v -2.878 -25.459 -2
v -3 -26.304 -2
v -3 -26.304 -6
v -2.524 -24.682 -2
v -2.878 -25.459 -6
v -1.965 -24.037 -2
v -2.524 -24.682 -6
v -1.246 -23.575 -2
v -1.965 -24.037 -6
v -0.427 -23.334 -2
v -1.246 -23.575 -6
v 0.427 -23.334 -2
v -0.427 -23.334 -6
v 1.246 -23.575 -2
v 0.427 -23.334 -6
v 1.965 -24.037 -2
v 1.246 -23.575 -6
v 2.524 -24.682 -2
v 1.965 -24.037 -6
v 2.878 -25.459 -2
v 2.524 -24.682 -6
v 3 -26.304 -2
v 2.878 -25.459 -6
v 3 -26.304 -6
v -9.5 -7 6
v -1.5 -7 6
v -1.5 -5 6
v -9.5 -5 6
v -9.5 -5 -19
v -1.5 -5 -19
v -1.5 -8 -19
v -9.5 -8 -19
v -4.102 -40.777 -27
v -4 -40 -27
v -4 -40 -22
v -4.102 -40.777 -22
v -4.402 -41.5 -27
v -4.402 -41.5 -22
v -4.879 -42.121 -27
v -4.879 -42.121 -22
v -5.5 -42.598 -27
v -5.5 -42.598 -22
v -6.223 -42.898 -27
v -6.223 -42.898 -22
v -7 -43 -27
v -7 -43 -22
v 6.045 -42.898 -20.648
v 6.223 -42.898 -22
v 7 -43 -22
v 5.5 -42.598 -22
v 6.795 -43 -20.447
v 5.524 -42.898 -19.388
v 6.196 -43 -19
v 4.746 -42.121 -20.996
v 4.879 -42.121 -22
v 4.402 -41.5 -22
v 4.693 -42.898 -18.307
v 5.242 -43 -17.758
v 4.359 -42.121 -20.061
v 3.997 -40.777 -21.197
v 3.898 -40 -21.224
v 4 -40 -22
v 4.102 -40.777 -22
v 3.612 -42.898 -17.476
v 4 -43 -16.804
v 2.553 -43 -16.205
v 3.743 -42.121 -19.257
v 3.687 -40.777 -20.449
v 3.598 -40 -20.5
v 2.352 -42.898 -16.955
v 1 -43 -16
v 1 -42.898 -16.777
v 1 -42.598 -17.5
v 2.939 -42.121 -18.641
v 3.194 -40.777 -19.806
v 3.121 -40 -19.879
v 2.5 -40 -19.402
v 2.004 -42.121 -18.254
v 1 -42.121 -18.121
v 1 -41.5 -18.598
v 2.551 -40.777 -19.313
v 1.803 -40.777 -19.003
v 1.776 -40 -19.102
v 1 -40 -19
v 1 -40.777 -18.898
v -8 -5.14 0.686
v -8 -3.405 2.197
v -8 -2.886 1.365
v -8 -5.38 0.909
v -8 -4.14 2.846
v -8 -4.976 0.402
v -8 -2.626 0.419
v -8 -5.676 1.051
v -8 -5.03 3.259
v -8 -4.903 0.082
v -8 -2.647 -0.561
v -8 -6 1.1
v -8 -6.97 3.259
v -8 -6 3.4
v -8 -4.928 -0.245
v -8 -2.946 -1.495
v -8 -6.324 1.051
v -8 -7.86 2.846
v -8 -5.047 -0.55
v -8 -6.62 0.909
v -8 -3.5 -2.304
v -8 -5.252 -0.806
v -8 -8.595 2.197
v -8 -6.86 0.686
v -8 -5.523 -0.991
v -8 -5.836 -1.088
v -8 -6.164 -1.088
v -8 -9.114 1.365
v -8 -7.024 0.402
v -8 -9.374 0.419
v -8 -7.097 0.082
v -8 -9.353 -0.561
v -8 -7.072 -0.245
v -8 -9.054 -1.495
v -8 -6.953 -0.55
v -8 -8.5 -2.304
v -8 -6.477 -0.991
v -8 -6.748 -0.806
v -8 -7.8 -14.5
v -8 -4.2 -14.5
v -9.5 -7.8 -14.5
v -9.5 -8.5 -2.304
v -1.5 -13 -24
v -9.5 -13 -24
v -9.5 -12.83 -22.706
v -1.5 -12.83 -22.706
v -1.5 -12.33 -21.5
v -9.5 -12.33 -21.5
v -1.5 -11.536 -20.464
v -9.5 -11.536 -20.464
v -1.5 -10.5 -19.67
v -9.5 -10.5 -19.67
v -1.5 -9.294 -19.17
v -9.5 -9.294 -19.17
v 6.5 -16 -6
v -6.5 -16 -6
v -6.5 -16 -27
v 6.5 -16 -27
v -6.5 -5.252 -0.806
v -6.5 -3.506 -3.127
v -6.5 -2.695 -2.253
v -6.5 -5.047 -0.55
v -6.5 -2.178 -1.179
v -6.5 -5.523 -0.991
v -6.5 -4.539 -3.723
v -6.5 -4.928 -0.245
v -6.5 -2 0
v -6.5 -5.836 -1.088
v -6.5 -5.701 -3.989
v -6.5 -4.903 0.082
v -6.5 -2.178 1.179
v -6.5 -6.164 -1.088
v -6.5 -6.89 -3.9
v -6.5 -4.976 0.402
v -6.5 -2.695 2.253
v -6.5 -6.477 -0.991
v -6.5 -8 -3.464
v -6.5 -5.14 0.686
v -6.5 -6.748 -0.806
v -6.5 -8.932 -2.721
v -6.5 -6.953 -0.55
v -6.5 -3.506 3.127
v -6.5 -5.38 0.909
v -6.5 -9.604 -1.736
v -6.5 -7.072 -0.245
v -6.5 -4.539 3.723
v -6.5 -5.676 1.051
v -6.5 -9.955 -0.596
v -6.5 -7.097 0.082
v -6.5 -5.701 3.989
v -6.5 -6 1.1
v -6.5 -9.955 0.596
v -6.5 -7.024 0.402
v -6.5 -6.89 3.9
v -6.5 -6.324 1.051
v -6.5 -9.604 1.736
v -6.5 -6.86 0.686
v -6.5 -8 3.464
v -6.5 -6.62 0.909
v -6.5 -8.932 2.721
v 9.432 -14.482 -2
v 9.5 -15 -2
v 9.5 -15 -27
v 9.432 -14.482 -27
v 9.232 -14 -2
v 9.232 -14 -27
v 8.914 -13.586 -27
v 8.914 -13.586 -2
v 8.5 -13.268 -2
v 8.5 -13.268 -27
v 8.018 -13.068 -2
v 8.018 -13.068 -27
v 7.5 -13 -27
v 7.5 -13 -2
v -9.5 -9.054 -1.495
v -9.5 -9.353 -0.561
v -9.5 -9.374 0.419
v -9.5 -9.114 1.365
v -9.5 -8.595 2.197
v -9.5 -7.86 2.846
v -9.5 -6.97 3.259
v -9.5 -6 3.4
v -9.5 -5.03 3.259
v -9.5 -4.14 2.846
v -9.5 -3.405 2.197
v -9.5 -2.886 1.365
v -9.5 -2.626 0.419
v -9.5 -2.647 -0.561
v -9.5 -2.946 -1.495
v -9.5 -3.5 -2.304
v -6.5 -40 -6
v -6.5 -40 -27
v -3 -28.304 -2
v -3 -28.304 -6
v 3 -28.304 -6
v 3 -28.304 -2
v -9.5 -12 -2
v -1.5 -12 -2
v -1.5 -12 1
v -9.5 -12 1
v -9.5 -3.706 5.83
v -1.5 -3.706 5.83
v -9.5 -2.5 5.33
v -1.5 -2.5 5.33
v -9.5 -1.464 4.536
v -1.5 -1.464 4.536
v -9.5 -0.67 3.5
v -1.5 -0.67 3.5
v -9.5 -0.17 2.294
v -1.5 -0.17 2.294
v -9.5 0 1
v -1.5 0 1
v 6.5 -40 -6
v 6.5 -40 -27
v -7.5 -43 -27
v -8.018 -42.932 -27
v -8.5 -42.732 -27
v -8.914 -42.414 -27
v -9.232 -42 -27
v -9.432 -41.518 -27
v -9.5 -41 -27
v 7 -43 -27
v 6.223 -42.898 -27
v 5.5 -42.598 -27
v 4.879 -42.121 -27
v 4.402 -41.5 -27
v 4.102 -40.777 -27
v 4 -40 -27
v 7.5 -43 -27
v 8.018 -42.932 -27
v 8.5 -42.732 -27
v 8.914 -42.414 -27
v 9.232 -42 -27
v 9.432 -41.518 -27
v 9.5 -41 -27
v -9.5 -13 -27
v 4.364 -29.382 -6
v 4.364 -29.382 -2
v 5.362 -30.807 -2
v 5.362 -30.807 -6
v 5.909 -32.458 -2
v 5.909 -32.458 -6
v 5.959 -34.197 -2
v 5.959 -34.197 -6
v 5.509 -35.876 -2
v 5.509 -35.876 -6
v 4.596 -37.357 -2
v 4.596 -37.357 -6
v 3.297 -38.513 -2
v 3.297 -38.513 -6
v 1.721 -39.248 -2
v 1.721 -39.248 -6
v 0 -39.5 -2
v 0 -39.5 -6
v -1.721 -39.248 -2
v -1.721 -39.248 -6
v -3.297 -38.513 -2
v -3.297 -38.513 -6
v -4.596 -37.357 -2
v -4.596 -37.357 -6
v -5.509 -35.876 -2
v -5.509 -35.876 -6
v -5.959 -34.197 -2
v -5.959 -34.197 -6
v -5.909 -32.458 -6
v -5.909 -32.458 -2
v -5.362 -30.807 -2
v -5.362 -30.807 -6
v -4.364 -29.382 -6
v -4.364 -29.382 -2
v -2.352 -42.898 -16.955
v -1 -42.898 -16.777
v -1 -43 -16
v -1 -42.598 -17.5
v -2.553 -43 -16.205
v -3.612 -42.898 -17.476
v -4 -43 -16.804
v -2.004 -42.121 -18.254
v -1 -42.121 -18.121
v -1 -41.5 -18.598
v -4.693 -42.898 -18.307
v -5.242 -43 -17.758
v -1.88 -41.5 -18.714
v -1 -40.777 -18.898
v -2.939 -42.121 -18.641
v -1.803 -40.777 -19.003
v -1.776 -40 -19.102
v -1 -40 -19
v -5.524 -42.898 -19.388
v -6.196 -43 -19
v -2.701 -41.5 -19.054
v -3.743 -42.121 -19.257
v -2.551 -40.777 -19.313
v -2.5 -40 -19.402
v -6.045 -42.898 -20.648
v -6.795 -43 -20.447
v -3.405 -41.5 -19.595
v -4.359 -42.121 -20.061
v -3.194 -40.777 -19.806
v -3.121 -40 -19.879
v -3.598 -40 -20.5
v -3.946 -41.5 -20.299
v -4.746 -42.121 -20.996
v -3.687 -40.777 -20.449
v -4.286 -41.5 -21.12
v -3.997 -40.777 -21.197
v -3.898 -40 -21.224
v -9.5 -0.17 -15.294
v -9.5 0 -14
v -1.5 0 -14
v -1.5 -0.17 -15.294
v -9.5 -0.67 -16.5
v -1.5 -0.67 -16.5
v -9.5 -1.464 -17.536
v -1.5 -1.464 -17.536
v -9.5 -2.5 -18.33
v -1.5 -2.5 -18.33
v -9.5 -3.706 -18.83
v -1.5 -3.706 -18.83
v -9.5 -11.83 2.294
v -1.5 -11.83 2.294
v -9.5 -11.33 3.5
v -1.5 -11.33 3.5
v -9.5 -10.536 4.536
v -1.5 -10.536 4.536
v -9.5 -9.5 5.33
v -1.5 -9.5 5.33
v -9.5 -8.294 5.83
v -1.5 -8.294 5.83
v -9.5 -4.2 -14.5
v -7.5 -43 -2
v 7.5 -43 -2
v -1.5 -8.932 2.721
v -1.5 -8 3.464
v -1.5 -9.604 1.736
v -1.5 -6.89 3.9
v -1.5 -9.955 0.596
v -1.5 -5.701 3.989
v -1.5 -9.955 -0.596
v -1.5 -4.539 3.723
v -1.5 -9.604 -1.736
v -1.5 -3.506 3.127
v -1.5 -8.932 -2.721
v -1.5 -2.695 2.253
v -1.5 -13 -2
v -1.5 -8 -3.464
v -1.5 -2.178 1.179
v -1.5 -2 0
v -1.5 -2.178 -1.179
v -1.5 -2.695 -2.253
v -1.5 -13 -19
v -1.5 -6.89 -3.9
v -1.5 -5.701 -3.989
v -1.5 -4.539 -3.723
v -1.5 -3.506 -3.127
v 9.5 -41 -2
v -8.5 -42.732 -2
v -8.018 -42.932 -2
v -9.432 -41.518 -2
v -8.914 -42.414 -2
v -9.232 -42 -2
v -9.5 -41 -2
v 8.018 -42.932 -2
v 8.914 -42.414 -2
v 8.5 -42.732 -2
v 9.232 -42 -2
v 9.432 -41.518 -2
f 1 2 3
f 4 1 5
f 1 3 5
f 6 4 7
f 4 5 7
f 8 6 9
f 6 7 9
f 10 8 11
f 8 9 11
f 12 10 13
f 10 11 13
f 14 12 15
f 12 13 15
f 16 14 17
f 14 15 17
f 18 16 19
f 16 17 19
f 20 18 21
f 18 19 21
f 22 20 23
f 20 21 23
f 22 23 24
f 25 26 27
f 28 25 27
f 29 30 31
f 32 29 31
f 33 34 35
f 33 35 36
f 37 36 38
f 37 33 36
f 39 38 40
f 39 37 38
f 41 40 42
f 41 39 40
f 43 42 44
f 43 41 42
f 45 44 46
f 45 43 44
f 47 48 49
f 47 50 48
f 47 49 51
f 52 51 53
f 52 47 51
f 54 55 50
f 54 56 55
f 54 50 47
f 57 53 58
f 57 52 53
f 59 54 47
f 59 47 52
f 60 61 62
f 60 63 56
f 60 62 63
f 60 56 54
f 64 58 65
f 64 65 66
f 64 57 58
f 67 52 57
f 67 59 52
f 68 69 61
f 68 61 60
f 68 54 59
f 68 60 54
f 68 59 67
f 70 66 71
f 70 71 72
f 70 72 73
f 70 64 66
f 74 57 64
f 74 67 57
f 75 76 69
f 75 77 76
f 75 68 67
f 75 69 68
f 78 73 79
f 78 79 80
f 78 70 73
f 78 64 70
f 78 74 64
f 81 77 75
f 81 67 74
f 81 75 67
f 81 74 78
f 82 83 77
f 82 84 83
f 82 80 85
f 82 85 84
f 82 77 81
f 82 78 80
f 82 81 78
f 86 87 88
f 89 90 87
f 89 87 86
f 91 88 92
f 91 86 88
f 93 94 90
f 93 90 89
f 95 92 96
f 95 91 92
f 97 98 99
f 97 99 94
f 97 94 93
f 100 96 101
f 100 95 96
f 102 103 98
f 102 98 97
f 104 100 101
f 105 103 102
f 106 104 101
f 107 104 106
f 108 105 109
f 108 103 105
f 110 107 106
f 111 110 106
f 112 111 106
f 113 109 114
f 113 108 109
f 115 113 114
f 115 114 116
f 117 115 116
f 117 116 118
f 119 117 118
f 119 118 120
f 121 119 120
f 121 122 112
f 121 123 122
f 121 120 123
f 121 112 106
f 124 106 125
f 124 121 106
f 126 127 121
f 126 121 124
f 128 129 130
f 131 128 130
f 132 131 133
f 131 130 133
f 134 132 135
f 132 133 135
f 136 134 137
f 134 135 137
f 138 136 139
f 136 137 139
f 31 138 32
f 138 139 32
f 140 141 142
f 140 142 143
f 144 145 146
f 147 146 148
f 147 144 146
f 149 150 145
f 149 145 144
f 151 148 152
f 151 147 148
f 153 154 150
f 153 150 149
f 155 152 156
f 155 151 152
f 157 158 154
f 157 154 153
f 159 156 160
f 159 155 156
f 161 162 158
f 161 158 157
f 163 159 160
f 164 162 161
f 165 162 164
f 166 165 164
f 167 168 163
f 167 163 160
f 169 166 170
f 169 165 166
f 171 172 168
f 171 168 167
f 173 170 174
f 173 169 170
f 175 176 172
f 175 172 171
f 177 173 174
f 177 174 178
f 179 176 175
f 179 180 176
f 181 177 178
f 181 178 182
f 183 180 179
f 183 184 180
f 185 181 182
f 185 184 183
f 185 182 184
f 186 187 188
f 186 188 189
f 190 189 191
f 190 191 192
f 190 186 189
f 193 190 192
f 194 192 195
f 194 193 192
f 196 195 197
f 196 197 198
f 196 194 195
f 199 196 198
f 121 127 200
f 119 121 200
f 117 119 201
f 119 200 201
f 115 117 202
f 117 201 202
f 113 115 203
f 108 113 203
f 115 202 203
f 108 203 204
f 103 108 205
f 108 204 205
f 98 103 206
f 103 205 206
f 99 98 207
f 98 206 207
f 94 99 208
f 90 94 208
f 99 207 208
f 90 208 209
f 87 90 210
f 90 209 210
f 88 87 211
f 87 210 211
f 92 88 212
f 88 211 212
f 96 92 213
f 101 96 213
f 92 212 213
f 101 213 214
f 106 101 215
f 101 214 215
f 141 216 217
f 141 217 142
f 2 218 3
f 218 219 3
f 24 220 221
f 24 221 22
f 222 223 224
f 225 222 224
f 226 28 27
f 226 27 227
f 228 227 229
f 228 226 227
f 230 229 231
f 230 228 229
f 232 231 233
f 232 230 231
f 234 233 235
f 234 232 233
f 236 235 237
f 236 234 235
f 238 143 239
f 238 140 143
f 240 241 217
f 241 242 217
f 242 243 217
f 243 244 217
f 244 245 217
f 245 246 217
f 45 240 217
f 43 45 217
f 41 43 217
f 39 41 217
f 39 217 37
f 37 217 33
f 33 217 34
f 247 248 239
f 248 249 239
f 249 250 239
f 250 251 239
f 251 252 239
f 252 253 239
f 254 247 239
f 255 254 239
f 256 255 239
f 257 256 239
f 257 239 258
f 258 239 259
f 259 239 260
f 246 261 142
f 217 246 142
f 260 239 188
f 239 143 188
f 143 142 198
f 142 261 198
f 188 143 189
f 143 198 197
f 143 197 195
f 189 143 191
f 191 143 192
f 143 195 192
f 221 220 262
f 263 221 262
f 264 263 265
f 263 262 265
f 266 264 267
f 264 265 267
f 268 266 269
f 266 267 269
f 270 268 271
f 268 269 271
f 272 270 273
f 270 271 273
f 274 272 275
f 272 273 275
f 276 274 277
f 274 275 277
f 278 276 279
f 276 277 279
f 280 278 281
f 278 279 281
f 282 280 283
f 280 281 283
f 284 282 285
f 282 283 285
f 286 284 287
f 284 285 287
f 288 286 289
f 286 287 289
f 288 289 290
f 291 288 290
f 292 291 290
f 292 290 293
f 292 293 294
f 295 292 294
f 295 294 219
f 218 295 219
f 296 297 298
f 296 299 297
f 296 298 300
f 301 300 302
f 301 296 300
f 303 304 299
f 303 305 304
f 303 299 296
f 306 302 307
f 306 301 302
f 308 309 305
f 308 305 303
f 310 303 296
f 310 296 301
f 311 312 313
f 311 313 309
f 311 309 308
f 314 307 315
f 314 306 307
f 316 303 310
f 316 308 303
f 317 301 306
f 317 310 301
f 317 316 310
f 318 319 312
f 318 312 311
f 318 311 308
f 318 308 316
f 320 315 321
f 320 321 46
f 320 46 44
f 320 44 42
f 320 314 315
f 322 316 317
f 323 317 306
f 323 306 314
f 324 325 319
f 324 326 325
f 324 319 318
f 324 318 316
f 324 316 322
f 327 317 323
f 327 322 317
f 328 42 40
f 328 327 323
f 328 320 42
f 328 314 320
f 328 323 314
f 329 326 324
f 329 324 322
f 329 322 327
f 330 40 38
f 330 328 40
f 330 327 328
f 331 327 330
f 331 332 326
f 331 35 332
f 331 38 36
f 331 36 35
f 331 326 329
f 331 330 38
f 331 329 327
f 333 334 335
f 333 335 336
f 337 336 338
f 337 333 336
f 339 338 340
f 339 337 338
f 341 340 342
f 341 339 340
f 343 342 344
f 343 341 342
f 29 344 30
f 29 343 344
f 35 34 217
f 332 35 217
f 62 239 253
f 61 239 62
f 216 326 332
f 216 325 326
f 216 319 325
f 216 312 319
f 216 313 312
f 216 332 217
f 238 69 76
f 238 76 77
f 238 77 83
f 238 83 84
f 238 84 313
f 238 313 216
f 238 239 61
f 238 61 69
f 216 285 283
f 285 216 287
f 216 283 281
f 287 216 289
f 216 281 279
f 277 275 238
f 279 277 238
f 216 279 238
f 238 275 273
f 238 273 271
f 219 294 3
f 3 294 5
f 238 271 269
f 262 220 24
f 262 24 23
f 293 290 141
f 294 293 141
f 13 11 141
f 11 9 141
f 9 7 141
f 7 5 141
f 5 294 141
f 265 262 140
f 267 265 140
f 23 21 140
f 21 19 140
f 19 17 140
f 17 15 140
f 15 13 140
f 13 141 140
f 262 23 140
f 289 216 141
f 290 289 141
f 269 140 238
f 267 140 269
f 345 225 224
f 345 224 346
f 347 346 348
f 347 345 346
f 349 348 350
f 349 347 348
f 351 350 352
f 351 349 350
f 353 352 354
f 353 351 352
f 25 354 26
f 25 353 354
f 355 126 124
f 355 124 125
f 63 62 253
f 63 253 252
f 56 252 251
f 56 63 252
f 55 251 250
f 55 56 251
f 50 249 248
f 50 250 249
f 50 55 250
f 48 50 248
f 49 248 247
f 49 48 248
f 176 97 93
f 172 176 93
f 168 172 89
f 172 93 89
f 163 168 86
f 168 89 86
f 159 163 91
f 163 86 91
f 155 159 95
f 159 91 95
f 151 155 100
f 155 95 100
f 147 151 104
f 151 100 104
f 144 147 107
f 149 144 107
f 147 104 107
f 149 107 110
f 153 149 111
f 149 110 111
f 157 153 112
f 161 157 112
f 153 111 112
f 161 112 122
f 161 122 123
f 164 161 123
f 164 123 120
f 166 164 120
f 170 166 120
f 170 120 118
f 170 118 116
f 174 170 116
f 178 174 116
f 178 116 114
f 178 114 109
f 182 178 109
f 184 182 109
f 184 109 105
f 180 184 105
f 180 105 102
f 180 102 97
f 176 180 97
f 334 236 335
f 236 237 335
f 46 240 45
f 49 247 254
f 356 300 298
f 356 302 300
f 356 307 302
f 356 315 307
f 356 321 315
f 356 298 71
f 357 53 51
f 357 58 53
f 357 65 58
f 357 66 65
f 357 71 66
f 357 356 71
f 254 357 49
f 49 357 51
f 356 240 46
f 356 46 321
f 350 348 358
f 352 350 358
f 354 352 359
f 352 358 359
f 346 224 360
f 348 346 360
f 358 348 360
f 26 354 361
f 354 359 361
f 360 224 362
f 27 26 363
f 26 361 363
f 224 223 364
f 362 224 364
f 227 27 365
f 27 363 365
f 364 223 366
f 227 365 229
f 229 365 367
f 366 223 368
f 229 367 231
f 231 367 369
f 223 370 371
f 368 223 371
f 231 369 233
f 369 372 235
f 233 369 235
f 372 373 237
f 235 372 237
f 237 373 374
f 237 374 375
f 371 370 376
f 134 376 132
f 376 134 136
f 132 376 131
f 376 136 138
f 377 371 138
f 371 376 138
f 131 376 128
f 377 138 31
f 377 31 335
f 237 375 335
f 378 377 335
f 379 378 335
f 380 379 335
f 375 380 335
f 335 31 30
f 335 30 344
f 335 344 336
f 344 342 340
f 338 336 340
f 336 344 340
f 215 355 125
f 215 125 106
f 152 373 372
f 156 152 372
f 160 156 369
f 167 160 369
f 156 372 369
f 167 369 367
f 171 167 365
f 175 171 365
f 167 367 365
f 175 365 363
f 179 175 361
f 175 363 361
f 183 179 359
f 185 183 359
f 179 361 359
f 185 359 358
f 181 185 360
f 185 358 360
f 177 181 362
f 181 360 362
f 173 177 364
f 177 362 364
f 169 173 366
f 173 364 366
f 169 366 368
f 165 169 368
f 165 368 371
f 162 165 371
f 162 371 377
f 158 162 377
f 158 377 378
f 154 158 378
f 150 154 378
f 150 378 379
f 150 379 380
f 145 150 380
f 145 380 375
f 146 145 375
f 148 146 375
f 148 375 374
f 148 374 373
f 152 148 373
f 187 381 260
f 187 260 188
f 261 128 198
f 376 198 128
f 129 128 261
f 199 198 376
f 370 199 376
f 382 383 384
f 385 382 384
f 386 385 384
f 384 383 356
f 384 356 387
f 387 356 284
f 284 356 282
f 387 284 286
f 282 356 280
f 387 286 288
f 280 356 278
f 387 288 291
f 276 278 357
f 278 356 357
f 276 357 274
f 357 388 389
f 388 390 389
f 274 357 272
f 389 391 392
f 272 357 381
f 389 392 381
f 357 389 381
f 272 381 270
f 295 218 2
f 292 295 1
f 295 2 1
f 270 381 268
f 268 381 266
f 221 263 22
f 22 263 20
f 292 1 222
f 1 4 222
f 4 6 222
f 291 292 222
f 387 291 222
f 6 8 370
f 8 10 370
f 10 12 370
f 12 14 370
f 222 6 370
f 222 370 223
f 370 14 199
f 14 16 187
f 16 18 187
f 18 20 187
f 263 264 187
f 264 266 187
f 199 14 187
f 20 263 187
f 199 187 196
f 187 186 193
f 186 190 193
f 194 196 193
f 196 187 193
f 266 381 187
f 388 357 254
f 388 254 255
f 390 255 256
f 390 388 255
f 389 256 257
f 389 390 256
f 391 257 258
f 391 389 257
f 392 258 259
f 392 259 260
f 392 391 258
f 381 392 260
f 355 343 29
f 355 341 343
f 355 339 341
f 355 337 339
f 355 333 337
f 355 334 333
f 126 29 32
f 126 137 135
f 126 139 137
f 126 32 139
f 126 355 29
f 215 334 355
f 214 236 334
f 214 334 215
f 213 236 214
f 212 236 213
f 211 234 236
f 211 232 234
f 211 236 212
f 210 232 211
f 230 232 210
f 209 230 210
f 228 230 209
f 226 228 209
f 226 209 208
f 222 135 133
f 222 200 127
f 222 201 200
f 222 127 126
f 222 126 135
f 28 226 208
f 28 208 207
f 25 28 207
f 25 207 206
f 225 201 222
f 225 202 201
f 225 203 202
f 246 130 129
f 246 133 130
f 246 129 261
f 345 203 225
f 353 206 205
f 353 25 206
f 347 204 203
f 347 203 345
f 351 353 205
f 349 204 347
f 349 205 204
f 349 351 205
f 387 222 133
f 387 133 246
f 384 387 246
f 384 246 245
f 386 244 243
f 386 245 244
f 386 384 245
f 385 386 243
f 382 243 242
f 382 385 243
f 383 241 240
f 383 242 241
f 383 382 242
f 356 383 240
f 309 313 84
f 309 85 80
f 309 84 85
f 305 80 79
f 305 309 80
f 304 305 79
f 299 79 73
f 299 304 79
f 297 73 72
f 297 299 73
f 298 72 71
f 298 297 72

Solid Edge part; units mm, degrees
sketch "Sketch1" plane through (0, 0, 0) normal (0, -1, 0) x (1, 0, 0)
  line L0 (-7, -6) -> (7, -6)
  line L1 (7, -6) -> (7, 6)
  line L2 (7, 6) -> (-7, 6)
  line L3 (-7, 6) -> (-7, -6)
  dimension "D1" = 12
  dimension "D2" = 14
extrude "Protrusion1" add sketch "Sketch1" along normal blind 40
sketch "Sketch2" plane through (0, -18, -6) normal (0, 0, -1) x (0, 1, 0)
  circle A0 centre (-15.5, 0) radius 6
  dimension "D1" = 12
  dimension "D2" = 6.5
extrude "Cutout1" cut sketch "Sketch2" against normal through all
sketch "Sketch3" plane through (7, -15, 0) normal (1, 0, 0) x (0, 1, 0)
  line L0 (-25, -2) -> (3, -2)
  line L1 (3, -2) -> (3, 6)
  dimension "D1" = 8
  dimension "D2" = 28
extrude "Cutout2" cut sketch "Sketch3" against normal through all material side at (7, -26, -1.95)
sketch "Sketch4" plane through (0, -18, -6) normal (0, 0, -1) x (0, 1, 0)
  line L0 (-10.3038, 3) -> (-8.3038, 3)
  arc A0 (-8.3038, 3) -> (-8.3038, -3) centre (-8.3038, 0) cw
  line L1 (-10.3038, -3) -> (-8.3038, -3)
  line L2 (-10.3038, 3) -> (-10.3038, -3)
  dimension "D1" = 6
  dimension "D2" = 2
extrude "Cutout3" cut sketch "Sketch4" against normal through all
sketch "Sketch5" plane through (7, -20, 0) normal (1, 0, 0) x (0, -1, 0)
  line L0 (20, 2) -> (23, 2)
  line L1 (23, 2) -> (23, 27)
  line L2 (23, 27) -> (20, 27)
  line L3 (20, 27) -> (20, 2)
  dimension "D1" = 3
  dimension "D2" = 25
extrude "Protrusion2" add sketch "Sketch5" against normal up to vertex (14 mm away)
sketch "Sketch6" plane through (0, -23, -6) normal (0, 0, -1) x (0, -1, 0)
  line L0 (17, 6.5) -> (-7, 6.5)
  line L1 (-7, 6.5) -> (-7, -6.5)
  line L2 (-7, -6.5) -> (17, -6.5)
  line L3 (17, -6.5) -> (17, -7)
  line L4 (17, -7) -> (20, -7)
  line L5 (20, -7) -> (20, -9.5)
  line L6 (20, -9.5) -> (-10, -9.5)
  line L7 (-10, -9.5) -> (-10, 9.5)
  line L8 (-10, 9.5) -> (20, 9.5)
  line L9 (20, 9.5) -> (20, 7)
  line L10 (20, 7) -> (17, 7)
  line L11 (17, 7) -> (17, 6.5)
  dimension "D1" = 13
  dimension "D2" = 3
  dimension "D3" = 3
  dimension "D4" = 3
  dimension "D5" = 24
extrude "Protrusion3" add sketch "Sketch6" along normal up to vertex (21 mm away) and the other way up to vertex (4 mm away)
sketch "Sketch7" plane through (0, -43, -14.5) normal (0, -1, 0) x (-1, 0, 0)
  line L0 (-4, 4.5) -> (4, 4.5)
  line L1 (4, 4.5) -> (4, 12.5)
  line L2 (4, 12.5) -> (-4, 12.5)
  line L3 (-4, 12.5) -> (-4, 4.5)
  dimension "D1" = 8
  dimension "D2" = 8
extrude "Cutout4" cut sketch "Sketch7" against normal up to next
fillet "Verrundung_9" radius 3 2 edges at (4, -41.5, -19) (-4, -41.5, -19)
fillet "Verrundung_10" radius 3 5 edges at (0, -43, -19) (-3.1213, -43, -19.8787) (-4, -43, -24.5) (3.1213, -43, -19.8787) (4, -43, -24.5)
sketch "Sketch8" plane through (9.5, -28, -14.5) normal (1, 0, 0) x (0, 1, 0)
  line L0 (15, 12.5) -> (16, 12.5)
  line L1 (16, 12.5) -> (16, 20.5)
  line L2 (16, 20.5) -> (28, 20.5)
  line L3 (28, 20.5) -> (28, -4.5)
  line L4 (28, -4.5) -> (15, -4.5)
  line L5 (15, -4.5) -> (15, 12.5)
  dimension "D1" = 25
extrude "Protrusion4" add sketch "Sketch8" against normal up to vertex (19 mm away)
sketch "Sketch9" plane through (-9.5, -21.5, -10.5) normal (-1, 0, 0) x (0, 1, 0)
  arc A0 (13, -8.1957) -> (18, -8.1957) centre (15.5, -10.5) ccw
  line L0 (17.3, 4) -> (18, -8.1957)
  line L1 (13.7, 4) -> (17.3, 4)
  line L2 (13, -8.1957) -> (13.7, 4)
  dimension "D1" = 3.4
  dimension "D2" = 3.6
  dimension "D3" = 14.5
  dimension "D4" = 6
  dimension "D5" = 5
extrude "Extrusionsausschnitt_13" cut sketch "Sketch9" against normal blind 1.5
sketch "Sketch10" plane through (0, -6.5, -19) normal (0, 0, -1) x (0, 1, 0)
  line L0 (-6.5, 9.5) -> (-6.5, -1.5)
  line L1 (-6.5, -1.5) -> (6.5, -1.5)
  dimension "D1" = 8
extrude "Cutout5" cut sketch "Sketch10" against normal through all material side at (4, -12.95, -19)
sketch "Sketch11" plane through (-9.5, -21.5, -10.5) normal (-1, 0, 0) x (0, 0, 1)
  circle A0 centre (10.5, 15.5) radius 1.1
  dimension "D1" = 2.2
extrude "Cutout6" cut sketch "Sketch11" against normal through all
sketch "Sketch12" plane through (-1.5, -6.5, -6.5) normal (1, 0, 0) x (0, 1, 0)
  circle A0 centre (0.5, 6.5) radius 4
  dimension "D1" = 8
extrude "Extrusionsausschnitt_16" cut sketch "Sketch12" against normal blind 5
fillet "Verrundung_30" radius 2 3 edges at (9.5, -13, -14.5) (9.5, -43, -14.5) (-9.5, -43, -14.5)
fillet "Verrundung_31" radius 5 4 edges at (-5.5, -13, -19) (-5.5, 0, -19) (-5.5, 0, 6) (-5.5, -12, 6)
properties material "Nylon, allgemein"
